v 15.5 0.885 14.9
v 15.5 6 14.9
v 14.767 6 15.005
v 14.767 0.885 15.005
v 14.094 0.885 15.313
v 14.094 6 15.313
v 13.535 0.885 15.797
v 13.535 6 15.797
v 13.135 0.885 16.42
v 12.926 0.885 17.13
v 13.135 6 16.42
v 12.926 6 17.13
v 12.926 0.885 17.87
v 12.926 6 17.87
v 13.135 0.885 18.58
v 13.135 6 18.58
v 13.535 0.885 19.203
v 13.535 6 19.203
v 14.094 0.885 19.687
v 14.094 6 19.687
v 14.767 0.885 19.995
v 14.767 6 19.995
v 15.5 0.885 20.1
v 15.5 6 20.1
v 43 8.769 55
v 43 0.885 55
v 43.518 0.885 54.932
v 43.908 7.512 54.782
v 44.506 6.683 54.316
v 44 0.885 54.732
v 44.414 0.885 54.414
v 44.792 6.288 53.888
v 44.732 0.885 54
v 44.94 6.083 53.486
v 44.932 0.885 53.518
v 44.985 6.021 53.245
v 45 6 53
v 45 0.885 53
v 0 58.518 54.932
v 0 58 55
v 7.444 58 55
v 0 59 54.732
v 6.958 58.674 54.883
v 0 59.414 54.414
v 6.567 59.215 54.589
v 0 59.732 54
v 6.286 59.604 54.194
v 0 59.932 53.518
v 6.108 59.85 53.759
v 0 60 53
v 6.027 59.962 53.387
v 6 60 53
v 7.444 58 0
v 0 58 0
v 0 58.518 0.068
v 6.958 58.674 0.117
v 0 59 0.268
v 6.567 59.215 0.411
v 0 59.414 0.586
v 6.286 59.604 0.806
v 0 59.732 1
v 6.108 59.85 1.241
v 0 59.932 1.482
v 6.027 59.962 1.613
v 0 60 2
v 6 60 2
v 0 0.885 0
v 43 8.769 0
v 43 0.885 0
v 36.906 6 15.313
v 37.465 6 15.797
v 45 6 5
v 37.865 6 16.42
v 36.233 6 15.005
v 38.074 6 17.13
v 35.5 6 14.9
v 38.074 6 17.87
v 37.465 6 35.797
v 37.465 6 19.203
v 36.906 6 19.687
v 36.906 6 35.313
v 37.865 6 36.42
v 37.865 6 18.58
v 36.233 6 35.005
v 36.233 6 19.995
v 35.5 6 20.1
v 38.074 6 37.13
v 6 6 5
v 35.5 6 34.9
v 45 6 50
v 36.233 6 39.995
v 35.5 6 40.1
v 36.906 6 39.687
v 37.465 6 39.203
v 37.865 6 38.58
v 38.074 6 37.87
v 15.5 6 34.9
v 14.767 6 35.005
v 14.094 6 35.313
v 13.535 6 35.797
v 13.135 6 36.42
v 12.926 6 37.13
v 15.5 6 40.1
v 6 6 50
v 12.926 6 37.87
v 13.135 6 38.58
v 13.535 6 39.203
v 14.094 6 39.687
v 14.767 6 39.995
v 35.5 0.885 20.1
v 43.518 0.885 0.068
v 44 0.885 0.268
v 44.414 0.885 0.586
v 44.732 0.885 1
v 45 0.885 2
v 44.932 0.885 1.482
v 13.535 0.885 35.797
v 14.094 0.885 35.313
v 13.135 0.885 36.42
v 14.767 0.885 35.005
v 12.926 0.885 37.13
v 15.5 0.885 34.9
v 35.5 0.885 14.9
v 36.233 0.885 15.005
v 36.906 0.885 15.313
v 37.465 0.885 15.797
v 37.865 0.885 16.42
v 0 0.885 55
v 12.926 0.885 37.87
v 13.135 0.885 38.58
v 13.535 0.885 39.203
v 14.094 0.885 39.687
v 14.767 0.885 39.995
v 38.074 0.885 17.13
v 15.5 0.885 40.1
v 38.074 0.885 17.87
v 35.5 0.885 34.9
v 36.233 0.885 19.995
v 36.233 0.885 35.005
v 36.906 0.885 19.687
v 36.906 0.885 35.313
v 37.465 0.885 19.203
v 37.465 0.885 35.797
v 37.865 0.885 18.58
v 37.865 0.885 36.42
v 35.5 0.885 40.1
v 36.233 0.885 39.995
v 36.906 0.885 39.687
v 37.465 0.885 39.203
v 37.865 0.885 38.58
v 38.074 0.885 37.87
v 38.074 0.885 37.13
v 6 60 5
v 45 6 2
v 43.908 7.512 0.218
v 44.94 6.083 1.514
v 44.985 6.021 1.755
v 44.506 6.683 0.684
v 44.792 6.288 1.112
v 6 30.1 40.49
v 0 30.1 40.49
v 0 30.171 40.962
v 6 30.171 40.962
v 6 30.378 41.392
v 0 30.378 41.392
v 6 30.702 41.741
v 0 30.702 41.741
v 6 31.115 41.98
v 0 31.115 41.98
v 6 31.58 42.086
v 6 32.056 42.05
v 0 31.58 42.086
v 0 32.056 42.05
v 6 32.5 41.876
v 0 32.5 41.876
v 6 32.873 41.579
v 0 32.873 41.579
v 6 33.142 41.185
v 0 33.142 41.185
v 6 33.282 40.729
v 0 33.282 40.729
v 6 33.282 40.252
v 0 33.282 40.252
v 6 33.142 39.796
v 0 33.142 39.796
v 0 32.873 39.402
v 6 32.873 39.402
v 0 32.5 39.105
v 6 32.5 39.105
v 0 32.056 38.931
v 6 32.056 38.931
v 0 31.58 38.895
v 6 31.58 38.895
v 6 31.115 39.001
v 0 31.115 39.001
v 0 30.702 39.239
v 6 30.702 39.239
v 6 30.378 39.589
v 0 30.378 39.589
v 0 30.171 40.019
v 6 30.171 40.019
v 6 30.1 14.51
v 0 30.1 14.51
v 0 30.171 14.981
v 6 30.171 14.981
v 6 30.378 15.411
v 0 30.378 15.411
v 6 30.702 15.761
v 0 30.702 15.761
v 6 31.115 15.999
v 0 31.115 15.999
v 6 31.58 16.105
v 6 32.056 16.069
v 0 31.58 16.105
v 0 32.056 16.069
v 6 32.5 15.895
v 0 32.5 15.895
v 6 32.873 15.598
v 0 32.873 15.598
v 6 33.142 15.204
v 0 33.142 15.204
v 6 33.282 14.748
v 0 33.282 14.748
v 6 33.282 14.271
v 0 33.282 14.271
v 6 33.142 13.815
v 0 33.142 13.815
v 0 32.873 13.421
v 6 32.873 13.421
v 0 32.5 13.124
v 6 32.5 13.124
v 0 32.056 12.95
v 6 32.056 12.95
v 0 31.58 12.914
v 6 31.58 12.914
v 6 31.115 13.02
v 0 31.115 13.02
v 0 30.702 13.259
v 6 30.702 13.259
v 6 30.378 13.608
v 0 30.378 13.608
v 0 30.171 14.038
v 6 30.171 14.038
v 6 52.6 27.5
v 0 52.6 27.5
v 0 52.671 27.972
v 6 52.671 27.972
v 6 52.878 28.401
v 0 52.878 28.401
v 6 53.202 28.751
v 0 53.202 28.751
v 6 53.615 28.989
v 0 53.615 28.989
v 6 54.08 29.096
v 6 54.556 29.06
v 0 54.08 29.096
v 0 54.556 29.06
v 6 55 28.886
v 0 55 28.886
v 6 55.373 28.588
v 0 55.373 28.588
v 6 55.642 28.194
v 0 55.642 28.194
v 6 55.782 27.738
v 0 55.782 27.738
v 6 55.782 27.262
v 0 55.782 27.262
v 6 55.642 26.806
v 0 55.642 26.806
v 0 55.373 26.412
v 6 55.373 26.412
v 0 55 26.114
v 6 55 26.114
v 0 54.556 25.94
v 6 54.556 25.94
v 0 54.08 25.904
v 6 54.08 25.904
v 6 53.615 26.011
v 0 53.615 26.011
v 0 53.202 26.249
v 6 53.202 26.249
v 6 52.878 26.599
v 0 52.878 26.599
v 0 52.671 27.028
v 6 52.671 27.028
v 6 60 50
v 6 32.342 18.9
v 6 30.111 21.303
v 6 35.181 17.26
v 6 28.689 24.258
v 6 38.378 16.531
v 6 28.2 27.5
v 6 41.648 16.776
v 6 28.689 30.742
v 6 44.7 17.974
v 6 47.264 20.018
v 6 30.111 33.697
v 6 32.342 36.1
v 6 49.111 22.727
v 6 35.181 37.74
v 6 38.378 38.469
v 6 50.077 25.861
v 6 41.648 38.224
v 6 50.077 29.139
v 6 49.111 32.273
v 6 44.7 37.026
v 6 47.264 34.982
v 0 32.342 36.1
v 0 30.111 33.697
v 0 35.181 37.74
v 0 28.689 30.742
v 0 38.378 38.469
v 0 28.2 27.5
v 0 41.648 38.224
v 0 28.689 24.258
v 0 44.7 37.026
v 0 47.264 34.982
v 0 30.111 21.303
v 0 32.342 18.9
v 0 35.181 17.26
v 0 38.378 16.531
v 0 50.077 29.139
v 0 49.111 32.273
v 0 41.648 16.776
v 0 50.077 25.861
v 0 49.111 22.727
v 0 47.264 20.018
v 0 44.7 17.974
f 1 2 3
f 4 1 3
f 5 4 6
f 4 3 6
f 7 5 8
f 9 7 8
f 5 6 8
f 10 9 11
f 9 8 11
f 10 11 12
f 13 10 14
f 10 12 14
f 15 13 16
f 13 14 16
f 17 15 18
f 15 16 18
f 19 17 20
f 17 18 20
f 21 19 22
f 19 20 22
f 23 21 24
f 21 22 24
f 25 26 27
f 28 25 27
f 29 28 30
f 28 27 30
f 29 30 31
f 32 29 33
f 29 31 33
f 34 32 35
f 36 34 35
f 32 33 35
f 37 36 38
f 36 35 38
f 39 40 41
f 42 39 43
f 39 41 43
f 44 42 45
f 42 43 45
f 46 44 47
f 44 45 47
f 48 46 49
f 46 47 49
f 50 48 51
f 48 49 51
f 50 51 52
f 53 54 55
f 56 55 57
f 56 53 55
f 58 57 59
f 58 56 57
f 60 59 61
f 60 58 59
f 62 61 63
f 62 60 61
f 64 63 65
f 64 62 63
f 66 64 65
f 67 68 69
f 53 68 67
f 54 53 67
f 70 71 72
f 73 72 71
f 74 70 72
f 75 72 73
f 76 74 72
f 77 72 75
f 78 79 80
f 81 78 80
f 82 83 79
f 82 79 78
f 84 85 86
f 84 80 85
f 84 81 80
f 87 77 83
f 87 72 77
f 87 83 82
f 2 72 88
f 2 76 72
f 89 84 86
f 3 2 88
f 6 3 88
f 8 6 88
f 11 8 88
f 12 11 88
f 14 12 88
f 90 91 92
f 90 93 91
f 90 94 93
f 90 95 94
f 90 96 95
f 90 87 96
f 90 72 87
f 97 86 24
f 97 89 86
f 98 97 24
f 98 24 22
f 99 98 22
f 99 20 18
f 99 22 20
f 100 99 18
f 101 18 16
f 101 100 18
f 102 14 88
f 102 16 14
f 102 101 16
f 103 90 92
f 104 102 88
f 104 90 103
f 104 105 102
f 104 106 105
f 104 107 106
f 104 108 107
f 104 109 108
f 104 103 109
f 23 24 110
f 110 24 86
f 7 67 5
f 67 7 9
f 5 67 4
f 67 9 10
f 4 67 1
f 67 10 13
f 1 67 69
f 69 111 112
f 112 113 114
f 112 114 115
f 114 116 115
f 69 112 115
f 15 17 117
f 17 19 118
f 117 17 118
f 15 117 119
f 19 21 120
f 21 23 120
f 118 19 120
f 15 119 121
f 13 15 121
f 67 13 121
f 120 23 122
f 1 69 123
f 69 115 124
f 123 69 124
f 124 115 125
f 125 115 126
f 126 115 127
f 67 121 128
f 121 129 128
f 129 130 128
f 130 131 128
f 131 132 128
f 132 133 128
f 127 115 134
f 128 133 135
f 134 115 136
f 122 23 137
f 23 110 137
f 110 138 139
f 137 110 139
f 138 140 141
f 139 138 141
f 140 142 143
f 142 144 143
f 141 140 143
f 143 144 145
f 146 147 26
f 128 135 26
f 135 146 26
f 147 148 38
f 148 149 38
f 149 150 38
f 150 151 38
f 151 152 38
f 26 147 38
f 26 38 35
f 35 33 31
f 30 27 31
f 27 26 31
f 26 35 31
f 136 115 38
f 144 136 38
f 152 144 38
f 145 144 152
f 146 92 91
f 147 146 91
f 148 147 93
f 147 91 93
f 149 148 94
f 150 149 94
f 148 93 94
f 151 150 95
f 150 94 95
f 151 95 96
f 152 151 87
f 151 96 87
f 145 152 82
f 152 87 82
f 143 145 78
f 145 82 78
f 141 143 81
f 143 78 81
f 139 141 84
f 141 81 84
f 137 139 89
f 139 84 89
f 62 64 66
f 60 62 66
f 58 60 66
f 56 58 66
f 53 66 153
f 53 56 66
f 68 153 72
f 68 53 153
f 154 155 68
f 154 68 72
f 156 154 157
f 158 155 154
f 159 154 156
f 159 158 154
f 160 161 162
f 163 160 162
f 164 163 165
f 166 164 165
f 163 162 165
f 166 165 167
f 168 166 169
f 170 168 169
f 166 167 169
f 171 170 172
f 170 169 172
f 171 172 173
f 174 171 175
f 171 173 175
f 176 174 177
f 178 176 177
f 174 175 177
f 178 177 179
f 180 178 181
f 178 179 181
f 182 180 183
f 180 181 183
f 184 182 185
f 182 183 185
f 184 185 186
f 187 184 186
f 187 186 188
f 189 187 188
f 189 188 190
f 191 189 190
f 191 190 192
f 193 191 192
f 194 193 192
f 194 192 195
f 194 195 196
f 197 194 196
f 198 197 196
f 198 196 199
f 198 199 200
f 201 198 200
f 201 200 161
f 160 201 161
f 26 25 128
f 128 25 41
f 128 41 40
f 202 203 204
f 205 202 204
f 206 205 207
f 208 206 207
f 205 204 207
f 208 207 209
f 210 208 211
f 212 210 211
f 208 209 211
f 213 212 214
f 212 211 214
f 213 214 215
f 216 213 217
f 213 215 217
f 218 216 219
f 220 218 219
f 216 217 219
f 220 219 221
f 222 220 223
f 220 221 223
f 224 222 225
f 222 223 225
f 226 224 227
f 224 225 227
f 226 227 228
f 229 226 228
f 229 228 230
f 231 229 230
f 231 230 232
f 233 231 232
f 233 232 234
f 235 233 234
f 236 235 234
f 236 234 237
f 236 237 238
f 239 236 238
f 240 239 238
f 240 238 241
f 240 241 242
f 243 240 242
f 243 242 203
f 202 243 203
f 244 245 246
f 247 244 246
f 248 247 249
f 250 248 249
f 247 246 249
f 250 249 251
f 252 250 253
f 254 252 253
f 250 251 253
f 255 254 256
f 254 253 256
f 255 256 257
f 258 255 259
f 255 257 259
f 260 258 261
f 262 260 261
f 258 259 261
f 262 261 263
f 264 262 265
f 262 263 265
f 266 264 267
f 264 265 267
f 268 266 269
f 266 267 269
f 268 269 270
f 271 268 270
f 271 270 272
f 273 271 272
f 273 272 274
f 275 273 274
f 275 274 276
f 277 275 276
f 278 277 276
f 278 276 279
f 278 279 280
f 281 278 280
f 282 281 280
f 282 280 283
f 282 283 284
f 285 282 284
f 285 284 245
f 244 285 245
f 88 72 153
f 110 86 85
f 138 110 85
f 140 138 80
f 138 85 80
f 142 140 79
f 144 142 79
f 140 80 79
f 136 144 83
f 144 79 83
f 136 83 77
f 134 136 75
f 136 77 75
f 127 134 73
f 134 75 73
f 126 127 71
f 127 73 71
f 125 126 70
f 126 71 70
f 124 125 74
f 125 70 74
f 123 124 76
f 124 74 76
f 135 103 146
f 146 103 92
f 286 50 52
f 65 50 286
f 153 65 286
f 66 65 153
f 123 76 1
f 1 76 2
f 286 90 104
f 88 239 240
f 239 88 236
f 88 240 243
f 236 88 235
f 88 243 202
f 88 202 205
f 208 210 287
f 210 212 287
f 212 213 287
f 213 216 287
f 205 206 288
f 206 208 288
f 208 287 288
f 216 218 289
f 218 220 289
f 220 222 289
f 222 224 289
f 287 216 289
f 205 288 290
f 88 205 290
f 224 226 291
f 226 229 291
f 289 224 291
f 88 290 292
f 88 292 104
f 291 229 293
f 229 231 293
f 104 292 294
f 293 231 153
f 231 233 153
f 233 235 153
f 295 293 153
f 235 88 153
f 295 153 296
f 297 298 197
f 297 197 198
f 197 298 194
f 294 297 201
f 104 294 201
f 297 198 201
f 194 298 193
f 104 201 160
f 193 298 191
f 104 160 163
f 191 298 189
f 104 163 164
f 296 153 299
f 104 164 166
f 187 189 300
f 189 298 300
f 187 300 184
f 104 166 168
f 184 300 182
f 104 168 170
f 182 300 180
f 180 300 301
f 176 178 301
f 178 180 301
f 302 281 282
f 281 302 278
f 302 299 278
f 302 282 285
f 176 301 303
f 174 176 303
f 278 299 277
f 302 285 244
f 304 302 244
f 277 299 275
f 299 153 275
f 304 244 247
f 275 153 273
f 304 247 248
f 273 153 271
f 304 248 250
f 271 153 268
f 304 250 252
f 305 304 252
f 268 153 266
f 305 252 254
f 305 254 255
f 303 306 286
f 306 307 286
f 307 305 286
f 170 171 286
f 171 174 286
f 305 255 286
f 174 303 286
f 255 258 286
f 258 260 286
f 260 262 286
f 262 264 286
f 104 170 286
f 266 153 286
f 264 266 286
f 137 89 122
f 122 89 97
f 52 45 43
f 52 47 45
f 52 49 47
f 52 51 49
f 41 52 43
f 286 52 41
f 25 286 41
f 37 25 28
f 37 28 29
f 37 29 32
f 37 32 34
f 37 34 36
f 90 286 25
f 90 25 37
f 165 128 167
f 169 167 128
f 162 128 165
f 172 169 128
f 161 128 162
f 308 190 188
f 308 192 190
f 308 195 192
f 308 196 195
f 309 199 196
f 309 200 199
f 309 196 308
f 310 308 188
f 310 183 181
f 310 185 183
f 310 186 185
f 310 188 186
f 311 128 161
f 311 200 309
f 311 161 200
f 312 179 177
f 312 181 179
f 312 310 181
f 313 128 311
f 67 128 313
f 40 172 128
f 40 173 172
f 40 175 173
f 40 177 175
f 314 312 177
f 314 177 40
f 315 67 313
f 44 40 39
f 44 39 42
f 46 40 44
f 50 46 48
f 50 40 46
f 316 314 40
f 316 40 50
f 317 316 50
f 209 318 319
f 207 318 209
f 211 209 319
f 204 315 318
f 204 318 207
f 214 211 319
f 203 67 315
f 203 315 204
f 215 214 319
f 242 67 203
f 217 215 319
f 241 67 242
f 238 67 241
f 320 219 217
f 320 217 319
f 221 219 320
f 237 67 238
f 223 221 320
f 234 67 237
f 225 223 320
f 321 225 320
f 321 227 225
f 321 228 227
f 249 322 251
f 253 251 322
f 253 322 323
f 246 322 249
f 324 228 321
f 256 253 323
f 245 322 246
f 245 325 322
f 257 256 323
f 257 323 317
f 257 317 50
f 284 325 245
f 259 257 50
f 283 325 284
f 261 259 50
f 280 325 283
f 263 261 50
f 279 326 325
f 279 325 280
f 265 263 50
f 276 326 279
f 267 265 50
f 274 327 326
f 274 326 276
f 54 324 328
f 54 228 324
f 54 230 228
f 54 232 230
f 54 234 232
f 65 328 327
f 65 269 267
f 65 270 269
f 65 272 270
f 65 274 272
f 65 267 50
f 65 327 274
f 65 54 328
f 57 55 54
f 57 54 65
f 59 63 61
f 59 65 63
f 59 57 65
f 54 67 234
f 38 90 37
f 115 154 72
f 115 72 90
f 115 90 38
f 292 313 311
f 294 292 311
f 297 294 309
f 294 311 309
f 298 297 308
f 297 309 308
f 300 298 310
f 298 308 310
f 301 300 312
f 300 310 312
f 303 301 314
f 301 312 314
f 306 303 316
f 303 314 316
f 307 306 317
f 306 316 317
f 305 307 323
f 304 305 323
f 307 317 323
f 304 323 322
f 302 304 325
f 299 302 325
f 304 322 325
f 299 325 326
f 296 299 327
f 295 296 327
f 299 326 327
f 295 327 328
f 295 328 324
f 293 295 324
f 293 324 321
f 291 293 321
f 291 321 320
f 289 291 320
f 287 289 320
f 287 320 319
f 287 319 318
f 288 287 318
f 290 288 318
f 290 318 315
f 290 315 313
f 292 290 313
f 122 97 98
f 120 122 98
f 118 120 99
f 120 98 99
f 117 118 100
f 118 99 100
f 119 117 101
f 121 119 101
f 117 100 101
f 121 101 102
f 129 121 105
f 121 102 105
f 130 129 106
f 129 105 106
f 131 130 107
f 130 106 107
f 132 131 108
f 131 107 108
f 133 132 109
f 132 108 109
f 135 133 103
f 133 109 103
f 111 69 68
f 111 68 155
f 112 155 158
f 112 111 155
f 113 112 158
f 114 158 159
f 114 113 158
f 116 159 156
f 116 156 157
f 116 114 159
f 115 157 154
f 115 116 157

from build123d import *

# Parameters (mm, degrees)
PAD_DEPTH       = 55
SKETCH001_W     = 39
SKETCH001_H     = 45
POCKET_DEPTH    = 54
SKETCH002_R     = 11
SKETCH002_R_2   = 1.6
POCKET001_DEPTH = 45.001
POCKET002_DEPTH = 6.001
FILLET_R        = 2
SKETCH004_W     = 0.885
SKETCH004_H     = 58.852348
POCKET003_DEPTH = 45.001


with BuildPart() as part:
    # Sketch → Pad (new body)
    with BuildSketch(Plane.XY):
        Polygon((0, 0), (0, 60), (6, 60), (45, 6), (45, 0), align=None)
    extrude(amount=PAD_DEPTH)

    # Sketch001 (on Face2 of Pad) → Pocket (cut)
    with BuildSketch(Plane(origin=(0, 60, 0), x_dir=(-1, 0, 0), z_dir=(0, 1, 0))):
        with Locations((-25.5, 27.5)):
            Rectangle(SKETCH001_W, SKETCH001_H)
    extrude(amount=-POCKET_DEPTH, mode=Mode.SUBTRACT)

    # Sketch002 (on Face1 of Pocket) → Pocket001 (cut, through all)
    with BuildSketch(Plane(origin=(0, 0, 0), x_dir=(0, -1, 0), z_dir=(-1, 0, 0))):
        with Locations((-39.2, 27.5)):
            Circle(SKETCH002_R)
        with Locations((-54.2, 27.5)):
            Circle(SKETCH002_R_2)
        with Locations((-31.7, 40.4904)):
            Circle(SKETCH002_R_2)
        with Locations((-31.7, 14.5096)):
            Circle(SKETCH002_R_2)
    extrude(amount=-POCKET001_DEPTH, mode=Mode.SUBTRACT)

    # Sketch003 (on Face14 of Pocket001) → Pocket002 (cut, through all)
    with BuildSketch(Plane(origin=(0, 6, 0), x_dir=(-1, 0, 0), z_dir=(0, 1, 0))):
        with BuildLine():
            ThreePointArc((-35.5, 40.1), (-38.1, 37.5), (-35.5, 34.9))
            Line((-35.5, 34.9), (-15.5, 34.9))
            ThreePointArc((-15.5, 34.9), (-12.9, 37.5), (-15.5, 40.1))
            Line((-15.5, 40.1), (-35.5, 40.1))
        make_face()
        with BuildLine():
            ThreePointArc((-35.5, 20.1), (-38.1, 17.5), (-35.5, 14.9))
            Line((-35.5, 14.9), (-15.5, 14.9))
            ThreePointArc((-15.5, 14.9), (-12.9, 17.5), (-15.5, 20.1))
            Line((-15.5, 20.1), (-35.5, 20.1))
        make_face()
    extrude(amount=-POCKET002_DEPTH, mode=Mode.SUBTRACT)

    # Fillet
    fillet_edges = [part.edges().sort_by_distance(p)[0] for p in [
        (3, 60, 55),
        (3, 60, 0),
        (45, 3, 0),
        (45, 3, 55),
    ]]
    fillet(fillet_edges, radius=FILLET_R)

    # Sketch004 (on Face14 of Fillet) → Pocket003 (cut, through all)
    with BuildSketch(Plane.YZ.offset(45)):
        with Locations((0.4425, 29.426174)):
            Rectangle(SKETCH004_W, SKETCH004_H)
    extrude(amount=-POCKET003_DEPTH, mode=Mode.SUBTRACT)


solid = part.part
